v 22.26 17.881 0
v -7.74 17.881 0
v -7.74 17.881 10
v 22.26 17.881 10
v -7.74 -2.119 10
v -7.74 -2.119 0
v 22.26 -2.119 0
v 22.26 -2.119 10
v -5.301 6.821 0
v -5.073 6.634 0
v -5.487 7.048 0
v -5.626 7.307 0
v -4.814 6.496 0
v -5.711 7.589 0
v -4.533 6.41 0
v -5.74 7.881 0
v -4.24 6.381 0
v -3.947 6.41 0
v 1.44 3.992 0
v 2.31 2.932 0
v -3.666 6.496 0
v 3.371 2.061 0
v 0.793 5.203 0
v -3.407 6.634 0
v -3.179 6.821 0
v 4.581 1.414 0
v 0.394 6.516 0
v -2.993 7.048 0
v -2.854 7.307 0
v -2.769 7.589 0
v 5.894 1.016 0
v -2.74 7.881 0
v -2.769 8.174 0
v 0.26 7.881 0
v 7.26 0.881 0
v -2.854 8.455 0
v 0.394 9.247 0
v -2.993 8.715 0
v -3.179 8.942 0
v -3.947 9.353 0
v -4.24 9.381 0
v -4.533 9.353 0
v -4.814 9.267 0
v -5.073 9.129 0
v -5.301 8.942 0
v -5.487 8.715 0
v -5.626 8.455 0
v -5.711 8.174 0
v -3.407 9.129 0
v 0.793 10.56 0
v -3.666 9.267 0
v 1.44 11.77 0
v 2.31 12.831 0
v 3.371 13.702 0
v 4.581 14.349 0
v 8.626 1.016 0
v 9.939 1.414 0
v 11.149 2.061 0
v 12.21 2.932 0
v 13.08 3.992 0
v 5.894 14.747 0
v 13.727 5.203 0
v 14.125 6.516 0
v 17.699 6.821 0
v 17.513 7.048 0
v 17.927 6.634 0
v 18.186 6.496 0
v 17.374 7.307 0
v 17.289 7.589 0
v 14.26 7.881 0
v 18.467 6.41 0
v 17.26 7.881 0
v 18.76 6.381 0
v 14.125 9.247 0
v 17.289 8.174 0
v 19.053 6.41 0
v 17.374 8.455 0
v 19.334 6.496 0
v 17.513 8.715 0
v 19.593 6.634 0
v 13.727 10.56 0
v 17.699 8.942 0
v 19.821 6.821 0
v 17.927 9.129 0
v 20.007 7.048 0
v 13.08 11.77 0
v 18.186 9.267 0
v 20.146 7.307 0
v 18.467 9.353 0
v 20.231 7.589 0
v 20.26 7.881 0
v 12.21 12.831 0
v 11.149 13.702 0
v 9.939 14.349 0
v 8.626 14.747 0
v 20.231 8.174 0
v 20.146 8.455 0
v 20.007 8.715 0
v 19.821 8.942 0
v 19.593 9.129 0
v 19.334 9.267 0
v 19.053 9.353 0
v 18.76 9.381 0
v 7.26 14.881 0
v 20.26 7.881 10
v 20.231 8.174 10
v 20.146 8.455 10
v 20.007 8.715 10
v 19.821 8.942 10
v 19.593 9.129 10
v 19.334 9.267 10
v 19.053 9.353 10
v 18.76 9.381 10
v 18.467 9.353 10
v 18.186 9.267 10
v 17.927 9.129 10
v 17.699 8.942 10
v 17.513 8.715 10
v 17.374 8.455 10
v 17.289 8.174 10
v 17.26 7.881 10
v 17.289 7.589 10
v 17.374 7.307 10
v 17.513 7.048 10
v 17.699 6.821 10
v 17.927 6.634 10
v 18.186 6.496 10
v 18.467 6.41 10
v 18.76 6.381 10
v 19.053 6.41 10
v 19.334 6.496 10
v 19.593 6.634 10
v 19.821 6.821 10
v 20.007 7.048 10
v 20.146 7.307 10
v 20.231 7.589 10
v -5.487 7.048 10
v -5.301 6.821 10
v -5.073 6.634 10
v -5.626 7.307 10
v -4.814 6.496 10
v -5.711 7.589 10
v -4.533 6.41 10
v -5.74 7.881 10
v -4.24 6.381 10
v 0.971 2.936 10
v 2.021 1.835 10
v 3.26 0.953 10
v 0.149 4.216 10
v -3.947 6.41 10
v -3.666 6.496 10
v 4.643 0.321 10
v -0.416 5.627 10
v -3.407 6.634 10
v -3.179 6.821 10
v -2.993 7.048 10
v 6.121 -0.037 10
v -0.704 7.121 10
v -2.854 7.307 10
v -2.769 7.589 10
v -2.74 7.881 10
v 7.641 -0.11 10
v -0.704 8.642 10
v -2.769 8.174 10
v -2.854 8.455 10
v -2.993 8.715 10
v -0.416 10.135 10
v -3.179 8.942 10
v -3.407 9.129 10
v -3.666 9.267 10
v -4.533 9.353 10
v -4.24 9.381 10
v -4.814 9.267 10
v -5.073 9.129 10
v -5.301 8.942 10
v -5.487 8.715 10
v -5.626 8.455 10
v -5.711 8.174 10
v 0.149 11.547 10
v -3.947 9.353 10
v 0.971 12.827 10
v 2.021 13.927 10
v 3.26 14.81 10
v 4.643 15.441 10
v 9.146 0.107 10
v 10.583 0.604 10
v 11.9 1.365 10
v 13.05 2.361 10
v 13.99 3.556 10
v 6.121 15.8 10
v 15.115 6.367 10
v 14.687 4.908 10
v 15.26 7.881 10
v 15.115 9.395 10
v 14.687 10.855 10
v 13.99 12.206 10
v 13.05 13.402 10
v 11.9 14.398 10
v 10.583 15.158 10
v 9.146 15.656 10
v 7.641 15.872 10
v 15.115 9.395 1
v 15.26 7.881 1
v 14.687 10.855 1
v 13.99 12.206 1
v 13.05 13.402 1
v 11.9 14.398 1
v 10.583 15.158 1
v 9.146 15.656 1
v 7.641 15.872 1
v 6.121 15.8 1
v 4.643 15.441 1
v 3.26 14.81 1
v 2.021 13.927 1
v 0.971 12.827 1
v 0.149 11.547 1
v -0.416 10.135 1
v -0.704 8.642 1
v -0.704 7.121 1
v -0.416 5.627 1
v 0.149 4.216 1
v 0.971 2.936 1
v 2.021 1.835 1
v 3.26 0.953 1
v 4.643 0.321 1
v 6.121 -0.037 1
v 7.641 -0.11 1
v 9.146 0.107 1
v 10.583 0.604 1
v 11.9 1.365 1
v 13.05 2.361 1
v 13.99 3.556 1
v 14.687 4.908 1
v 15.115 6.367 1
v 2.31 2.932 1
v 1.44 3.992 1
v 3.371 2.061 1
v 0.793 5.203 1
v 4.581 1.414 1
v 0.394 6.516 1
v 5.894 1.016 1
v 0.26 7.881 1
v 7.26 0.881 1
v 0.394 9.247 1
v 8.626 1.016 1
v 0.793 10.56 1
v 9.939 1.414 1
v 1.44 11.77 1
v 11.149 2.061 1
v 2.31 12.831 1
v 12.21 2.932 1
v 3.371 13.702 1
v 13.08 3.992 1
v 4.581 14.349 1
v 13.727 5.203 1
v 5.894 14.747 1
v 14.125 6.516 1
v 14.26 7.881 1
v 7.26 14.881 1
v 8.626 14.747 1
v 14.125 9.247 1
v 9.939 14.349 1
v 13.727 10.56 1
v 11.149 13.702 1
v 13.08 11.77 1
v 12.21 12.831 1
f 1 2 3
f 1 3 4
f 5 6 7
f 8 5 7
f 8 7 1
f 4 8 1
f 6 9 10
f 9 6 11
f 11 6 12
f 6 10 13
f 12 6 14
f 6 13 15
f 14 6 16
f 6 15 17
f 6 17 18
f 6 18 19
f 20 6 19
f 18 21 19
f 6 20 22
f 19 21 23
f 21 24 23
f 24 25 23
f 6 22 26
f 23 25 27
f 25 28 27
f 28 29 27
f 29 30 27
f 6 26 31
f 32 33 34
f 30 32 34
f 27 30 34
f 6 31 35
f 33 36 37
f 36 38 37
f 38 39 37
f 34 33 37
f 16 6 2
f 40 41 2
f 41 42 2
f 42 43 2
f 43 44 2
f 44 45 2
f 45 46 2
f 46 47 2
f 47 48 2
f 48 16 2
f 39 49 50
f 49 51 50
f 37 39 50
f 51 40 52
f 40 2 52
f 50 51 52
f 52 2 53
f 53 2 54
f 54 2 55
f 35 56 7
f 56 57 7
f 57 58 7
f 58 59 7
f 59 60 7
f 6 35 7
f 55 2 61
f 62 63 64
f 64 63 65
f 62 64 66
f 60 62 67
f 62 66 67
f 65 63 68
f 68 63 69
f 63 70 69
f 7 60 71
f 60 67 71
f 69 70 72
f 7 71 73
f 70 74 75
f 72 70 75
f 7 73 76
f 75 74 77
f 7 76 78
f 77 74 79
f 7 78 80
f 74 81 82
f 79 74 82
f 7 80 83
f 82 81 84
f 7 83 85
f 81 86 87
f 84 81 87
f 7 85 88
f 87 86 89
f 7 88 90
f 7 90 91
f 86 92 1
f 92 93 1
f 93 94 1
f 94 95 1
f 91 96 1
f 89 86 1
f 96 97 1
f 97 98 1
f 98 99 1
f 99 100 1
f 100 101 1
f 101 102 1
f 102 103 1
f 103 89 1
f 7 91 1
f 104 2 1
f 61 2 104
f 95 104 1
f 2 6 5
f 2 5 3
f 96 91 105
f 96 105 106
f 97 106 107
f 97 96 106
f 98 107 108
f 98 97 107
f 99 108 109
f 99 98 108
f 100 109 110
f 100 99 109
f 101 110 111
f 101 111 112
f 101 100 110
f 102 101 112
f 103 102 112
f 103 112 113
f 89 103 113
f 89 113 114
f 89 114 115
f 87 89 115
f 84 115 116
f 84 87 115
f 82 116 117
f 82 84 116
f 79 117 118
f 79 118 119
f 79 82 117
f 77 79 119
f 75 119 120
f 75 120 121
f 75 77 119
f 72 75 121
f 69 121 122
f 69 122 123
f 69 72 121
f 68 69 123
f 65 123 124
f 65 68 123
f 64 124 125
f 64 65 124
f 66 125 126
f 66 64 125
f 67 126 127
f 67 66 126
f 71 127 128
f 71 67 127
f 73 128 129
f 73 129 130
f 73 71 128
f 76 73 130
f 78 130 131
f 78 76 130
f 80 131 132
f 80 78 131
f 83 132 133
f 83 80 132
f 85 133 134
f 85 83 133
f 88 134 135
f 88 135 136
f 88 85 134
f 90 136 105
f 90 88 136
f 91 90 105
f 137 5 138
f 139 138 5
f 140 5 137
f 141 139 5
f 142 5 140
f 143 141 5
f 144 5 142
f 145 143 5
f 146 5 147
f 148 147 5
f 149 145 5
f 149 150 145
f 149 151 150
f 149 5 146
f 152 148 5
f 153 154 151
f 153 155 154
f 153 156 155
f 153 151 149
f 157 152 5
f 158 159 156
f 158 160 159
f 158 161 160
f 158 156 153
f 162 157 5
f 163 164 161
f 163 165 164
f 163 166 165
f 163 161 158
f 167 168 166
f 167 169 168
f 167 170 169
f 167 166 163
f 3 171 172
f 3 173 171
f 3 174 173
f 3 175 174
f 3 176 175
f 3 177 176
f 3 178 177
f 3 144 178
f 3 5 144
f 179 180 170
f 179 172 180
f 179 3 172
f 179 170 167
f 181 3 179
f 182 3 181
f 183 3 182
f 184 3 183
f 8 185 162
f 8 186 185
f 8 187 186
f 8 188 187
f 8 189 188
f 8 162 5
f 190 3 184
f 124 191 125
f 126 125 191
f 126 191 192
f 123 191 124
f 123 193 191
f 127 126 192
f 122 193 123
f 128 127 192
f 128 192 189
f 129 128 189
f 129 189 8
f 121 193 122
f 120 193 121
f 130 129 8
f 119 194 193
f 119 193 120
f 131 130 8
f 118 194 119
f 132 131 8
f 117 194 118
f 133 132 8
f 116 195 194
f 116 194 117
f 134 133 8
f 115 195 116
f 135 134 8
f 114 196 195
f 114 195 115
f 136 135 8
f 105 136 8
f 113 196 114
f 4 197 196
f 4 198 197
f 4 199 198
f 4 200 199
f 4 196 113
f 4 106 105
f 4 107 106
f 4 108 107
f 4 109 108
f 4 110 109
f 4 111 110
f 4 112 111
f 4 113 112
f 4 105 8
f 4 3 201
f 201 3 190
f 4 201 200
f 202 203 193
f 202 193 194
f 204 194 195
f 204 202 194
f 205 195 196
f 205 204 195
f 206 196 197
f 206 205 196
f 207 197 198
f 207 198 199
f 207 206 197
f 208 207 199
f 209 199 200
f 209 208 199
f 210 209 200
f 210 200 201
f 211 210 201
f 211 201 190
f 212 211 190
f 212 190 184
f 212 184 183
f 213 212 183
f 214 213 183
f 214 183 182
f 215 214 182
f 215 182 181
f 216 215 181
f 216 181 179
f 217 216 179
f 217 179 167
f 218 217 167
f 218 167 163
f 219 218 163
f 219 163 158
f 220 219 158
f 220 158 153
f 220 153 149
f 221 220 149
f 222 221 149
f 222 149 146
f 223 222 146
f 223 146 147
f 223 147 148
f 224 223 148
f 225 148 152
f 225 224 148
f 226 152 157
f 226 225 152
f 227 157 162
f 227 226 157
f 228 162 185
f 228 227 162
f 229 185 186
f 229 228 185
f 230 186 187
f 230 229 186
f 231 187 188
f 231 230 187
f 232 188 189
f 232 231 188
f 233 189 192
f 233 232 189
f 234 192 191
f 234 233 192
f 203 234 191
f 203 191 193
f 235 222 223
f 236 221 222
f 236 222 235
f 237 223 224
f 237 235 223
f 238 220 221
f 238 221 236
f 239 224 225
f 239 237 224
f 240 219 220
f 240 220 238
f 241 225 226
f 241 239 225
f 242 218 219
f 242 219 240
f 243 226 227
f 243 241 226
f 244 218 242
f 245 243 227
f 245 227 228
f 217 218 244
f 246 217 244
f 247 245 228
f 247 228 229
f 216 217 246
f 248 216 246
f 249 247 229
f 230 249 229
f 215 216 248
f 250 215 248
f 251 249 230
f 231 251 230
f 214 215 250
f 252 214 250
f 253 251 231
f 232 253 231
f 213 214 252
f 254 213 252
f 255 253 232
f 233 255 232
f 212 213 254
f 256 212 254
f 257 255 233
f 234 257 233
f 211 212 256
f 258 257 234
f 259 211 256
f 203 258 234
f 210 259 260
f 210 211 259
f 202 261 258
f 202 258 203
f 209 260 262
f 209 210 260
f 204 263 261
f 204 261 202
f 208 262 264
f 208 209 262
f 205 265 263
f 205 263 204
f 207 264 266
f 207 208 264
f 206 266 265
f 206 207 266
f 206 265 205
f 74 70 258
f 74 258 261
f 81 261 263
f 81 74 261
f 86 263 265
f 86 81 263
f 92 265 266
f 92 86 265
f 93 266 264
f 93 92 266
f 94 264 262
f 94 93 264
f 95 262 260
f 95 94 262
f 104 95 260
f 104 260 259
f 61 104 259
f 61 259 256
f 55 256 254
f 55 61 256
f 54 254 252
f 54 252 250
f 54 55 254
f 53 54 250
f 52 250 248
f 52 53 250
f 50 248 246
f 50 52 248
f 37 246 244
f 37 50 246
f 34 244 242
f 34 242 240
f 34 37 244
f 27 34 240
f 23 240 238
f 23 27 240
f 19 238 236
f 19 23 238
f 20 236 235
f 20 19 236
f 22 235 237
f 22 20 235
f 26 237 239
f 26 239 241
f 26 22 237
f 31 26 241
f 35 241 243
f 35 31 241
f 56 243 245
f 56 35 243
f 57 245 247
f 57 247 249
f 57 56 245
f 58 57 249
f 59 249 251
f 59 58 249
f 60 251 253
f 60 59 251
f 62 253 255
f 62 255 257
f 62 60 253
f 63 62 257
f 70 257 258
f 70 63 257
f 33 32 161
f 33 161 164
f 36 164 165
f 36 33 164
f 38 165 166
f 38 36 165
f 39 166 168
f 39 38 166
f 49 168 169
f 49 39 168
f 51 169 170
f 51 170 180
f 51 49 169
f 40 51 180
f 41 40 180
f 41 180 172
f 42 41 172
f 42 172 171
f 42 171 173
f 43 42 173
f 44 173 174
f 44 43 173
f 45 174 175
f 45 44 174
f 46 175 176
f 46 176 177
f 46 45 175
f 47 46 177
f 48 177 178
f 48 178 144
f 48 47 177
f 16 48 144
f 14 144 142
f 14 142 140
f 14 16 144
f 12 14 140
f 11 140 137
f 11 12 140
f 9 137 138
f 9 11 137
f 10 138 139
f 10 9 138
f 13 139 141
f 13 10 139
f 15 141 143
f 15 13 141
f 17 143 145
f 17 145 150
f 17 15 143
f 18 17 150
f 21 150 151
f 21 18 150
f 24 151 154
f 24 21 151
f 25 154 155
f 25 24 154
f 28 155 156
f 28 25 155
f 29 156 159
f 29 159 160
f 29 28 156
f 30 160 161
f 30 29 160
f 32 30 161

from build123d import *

# Parameters (mm, degrees)
SKETCH1_W           = 30
SKETCH1_H           = 20
SKETCH1_R           = 1.5
SKETCH1_R_2         = 8
BOSS_EXTRUDE1_DEPTH = 10
SKETCH1_3_R         = 8
SKETCH1_3_R_2       = 7
BOSS_EXTRUDE2_DEPTH = 1


with BuildPart() as part:
    # Sketch1 → Boss-Extrude1 (new body)
    with BuildSketch(Plane.XY):
        with Locations((7.259887006, 7.881355932)):
            Rectangle(SKETCH1_W, SKETCH1_H)
        with Locations((18.759887006, 7.881355932)):
            Circle(SKETCH1_R, mode=Mode.SUBTRACT)
        with Locations((-4.240112994, 7.881355932)):
            Circle(SKETCH1_R, mode=Mode.SUBTRACT)
        with Locations((7.259887006, 7.881355932)):
            Circle(SKETCH1_R_2, mode=Mode.SUBTRACT)
    extrude(amount=BOSS_EXTRUDE1_DEPTH)

    # Sketch1<3> → Boss-Extrude2 (add)
    with BuildSketch(Plane.XY):
        with Locations((7.259887006, 7.881355932)):
            Circle(SKETCH1_3_R)
        with Locations((7.259887006, 7.881355932)):
            Circle(SKETCH1_3_R_2, mode=Mode.SUBTRACT)
    extrude(amount=BOSS_EXTRUDE2_DEPTH)


solid = part.part
